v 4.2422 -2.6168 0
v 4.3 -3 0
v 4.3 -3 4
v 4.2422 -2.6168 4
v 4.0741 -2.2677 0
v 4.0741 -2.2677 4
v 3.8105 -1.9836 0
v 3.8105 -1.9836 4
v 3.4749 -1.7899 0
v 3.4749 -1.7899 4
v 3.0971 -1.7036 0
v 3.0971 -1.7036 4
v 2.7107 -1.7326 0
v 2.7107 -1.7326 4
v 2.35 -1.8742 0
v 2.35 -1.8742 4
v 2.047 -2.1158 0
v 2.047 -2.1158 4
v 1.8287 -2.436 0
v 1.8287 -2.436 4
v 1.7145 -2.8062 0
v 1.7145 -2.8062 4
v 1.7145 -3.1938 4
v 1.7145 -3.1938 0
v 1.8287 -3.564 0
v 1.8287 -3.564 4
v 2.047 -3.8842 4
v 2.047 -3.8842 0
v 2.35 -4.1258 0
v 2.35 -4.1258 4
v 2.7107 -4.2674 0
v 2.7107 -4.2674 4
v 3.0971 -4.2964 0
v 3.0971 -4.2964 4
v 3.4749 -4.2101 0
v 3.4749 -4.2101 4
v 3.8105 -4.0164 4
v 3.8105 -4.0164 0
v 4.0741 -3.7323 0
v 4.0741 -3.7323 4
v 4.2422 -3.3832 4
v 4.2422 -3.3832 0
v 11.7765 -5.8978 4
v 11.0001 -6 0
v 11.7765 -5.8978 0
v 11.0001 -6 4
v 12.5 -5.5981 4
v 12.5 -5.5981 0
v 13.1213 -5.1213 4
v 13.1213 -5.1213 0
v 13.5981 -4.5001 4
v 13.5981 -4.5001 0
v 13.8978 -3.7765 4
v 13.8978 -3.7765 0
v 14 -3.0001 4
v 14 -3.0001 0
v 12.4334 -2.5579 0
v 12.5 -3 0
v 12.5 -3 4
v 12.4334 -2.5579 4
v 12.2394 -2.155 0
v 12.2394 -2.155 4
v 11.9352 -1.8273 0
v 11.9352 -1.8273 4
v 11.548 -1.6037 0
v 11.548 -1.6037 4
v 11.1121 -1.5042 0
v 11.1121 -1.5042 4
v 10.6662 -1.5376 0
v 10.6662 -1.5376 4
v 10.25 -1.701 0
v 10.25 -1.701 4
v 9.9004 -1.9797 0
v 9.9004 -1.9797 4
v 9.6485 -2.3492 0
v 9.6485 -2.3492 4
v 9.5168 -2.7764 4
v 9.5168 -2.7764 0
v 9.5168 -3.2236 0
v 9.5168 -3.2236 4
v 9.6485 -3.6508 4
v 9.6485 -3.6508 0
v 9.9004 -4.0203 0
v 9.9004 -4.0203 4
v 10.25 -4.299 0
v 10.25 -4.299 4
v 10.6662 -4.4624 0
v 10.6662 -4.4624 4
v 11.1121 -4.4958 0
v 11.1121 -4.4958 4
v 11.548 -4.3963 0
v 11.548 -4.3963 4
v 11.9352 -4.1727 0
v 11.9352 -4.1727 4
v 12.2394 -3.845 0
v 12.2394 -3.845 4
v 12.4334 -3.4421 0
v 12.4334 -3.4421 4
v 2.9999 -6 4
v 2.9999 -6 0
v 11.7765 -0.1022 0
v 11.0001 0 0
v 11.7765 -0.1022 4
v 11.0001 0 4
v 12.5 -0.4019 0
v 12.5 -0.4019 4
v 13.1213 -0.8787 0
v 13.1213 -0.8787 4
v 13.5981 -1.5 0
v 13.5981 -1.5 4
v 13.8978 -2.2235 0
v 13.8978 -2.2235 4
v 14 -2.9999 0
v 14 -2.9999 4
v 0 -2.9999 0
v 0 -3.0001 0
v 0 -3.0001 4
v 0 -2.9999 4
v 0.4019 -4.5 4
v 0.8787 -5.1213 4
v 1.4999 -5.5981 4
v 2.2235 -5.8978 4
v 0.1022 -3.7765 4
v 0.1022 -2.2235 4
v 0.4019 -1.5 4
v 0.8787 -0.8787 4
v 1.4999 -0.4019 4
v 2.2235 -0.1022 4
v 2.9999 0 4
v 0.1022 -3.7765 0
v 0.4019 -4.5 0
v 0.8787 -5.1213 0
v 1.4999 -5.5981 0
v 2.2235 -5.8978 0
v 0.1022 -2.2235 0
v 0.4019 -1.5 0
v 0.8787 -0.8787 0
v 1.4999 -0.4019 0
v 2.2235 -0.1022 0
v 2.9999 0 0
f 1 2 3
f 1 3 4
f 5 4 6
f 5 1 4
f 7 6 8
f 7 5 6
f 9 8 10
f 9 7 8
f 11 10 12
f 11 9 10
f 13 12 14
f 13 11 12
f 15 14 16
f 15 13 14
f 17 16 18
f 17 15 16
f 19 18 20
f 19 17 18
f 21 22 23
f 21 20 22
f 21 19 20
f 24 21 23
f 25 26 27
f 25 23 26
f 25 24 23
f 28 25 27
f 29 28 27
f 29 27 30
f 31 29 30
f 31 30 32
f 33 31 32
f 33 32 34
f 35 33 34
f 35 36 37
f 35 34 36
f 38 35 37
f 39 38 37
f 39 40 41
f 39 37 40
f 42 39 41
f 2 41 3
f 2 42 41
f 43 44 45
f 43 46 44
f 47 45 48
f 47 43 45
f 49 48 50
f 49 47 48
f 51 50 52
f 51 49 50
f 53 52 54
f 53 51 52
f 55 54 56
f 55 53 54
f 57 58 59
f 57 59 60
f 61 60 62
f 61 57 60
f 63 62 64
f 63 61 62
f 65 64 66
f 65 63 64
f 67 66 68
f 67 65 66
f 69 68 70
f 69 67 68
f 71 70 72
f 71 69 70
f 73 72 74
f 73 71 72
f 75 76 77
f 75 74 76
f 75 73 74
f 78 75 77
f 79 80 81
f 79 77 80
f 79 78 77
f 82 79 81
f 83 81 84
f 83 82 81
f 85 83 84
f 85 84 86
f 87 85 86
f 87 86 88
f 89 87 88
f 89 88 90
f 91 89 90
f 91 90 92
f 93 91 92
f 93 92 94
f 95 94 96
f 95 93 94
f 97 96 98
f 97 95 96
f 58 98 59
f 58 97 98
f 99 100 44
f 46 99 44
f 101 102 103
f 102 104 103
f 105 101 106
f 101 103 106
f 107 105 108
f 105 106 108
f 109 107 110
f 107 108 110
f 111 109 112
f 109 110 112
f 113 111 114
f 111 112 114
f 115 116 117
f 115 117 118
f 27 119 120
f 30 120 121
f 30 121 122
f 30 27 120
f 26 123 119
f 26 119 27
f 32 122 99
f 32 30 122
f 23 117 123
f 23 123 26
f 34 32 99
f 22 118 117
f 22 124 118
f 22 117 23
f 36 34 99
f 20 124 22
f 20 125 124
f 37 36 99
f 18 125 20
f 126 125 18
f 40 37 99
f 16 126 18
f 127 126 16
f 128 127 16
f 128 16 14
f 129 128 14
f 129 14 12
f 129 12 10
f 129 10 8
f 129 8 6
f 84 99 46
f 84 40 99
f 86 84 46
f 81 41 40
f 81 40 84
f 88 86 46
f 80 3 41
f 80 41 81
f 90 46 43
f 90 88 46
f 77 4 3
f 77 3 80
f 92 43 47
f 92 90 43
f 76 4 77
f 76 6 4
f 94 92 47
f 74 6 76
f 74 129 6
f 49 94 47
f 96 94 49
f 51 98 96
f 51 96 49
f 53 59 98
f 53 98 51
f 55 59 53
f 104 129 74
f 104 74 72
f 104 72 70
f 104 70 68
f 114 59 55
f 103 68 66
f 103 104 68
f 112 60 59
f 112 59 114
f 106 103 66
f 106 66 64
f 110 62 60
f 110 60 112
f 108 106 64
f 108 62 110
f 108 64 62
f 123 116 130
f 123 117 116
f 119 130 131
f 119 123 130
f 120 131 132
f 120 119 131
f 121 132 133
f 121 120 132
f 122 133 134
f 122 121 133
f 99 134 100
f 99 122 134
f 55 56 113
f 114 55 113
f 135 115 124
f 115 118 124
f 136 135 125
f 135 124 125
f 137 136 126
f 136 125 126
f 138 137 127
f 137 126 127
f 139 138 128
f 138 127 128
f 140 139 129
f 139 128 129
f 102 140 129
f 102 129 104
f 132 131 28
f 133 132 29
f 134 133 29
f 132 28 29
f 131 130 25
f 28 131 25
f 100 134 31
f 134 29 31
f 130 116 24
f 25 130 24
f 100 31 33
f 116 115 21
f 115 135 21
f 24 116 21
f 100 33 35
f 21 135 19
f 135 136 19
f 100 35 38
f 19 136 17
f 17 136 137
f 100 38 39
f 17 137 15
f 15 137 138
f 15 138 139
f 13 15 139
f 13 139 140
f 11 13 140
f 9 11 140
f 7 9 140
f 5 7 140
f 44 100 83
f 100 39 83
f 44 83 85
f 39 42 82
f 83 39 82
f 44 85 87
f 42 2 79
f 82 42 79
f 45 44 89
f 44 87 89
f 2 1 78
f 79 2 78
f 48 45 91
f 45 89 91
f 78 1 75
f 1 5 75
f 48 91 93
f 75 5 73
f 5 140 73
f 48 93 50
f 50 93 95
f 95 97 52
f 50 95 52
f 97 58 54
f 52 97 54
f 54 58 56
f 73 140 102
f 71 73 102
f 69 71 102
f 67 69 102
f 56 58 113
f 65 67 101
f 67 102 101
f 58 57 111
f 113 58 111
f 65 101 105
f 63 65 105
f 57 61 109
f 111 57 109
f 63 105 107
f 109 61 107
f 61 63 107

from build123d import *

# Parameters (mm, degrees)
SKETCH1_W               = 14
SKETCH1_H               = 6
BOSS_EXTRUDE1_DEPTH     = 4
CUT_EXTRUDE1_DEPTH      = 16.748015748
CUT_EXTRUDE1_DEPTH_BACK = 16.748015748
SKETCH2_R               = 1.3
SKETCH2_R_2             = 1.5
FILLET1_R               = 3


with BuildPart() as part:
    # Sketch1 → Boss-Extrude1 (new body)
    with BuildSketch(Plane.XY):
        with Locations((7, -3)):
            Rectangle(SKETCH1_W, SKETCH1_H)
    extrude(amount=BOSS_EXTRUDE1_DEPTH)

    # Sketch2 → Cut-Extrude1 (cut, two sides: drawn at the far end of the back side and taken through both)
    with BuildSketch(Plane.XY.offset(4).offset(-CUT_EXTRUDE1_DEPTH_BACK)):
        with Locations((3, -3)):
            Circle(SKETCH2_R)
        with Locations((11, -3)):
            Circle(SKETCH2_R_2)
    extrude(amount=CUT_EXTRUDE1_DEPTH + CUT_EXTRUDE1_DEPTH_BACK, mode=Mode.SUBTRACT)

    # Fillet1
    fillet1_edges = [part.edges().sort_by_distance(p)[0] for p in [
        (14, -6, 2),
        (14, 0, 2),
        (0, -6, 2),
        (0, 0, 2),
    ]]
    fillet(fillet1_edges, radius=FILLET1_R - 0.0001)  # a hair under: the kernel refuses the full size


solid = part.part
